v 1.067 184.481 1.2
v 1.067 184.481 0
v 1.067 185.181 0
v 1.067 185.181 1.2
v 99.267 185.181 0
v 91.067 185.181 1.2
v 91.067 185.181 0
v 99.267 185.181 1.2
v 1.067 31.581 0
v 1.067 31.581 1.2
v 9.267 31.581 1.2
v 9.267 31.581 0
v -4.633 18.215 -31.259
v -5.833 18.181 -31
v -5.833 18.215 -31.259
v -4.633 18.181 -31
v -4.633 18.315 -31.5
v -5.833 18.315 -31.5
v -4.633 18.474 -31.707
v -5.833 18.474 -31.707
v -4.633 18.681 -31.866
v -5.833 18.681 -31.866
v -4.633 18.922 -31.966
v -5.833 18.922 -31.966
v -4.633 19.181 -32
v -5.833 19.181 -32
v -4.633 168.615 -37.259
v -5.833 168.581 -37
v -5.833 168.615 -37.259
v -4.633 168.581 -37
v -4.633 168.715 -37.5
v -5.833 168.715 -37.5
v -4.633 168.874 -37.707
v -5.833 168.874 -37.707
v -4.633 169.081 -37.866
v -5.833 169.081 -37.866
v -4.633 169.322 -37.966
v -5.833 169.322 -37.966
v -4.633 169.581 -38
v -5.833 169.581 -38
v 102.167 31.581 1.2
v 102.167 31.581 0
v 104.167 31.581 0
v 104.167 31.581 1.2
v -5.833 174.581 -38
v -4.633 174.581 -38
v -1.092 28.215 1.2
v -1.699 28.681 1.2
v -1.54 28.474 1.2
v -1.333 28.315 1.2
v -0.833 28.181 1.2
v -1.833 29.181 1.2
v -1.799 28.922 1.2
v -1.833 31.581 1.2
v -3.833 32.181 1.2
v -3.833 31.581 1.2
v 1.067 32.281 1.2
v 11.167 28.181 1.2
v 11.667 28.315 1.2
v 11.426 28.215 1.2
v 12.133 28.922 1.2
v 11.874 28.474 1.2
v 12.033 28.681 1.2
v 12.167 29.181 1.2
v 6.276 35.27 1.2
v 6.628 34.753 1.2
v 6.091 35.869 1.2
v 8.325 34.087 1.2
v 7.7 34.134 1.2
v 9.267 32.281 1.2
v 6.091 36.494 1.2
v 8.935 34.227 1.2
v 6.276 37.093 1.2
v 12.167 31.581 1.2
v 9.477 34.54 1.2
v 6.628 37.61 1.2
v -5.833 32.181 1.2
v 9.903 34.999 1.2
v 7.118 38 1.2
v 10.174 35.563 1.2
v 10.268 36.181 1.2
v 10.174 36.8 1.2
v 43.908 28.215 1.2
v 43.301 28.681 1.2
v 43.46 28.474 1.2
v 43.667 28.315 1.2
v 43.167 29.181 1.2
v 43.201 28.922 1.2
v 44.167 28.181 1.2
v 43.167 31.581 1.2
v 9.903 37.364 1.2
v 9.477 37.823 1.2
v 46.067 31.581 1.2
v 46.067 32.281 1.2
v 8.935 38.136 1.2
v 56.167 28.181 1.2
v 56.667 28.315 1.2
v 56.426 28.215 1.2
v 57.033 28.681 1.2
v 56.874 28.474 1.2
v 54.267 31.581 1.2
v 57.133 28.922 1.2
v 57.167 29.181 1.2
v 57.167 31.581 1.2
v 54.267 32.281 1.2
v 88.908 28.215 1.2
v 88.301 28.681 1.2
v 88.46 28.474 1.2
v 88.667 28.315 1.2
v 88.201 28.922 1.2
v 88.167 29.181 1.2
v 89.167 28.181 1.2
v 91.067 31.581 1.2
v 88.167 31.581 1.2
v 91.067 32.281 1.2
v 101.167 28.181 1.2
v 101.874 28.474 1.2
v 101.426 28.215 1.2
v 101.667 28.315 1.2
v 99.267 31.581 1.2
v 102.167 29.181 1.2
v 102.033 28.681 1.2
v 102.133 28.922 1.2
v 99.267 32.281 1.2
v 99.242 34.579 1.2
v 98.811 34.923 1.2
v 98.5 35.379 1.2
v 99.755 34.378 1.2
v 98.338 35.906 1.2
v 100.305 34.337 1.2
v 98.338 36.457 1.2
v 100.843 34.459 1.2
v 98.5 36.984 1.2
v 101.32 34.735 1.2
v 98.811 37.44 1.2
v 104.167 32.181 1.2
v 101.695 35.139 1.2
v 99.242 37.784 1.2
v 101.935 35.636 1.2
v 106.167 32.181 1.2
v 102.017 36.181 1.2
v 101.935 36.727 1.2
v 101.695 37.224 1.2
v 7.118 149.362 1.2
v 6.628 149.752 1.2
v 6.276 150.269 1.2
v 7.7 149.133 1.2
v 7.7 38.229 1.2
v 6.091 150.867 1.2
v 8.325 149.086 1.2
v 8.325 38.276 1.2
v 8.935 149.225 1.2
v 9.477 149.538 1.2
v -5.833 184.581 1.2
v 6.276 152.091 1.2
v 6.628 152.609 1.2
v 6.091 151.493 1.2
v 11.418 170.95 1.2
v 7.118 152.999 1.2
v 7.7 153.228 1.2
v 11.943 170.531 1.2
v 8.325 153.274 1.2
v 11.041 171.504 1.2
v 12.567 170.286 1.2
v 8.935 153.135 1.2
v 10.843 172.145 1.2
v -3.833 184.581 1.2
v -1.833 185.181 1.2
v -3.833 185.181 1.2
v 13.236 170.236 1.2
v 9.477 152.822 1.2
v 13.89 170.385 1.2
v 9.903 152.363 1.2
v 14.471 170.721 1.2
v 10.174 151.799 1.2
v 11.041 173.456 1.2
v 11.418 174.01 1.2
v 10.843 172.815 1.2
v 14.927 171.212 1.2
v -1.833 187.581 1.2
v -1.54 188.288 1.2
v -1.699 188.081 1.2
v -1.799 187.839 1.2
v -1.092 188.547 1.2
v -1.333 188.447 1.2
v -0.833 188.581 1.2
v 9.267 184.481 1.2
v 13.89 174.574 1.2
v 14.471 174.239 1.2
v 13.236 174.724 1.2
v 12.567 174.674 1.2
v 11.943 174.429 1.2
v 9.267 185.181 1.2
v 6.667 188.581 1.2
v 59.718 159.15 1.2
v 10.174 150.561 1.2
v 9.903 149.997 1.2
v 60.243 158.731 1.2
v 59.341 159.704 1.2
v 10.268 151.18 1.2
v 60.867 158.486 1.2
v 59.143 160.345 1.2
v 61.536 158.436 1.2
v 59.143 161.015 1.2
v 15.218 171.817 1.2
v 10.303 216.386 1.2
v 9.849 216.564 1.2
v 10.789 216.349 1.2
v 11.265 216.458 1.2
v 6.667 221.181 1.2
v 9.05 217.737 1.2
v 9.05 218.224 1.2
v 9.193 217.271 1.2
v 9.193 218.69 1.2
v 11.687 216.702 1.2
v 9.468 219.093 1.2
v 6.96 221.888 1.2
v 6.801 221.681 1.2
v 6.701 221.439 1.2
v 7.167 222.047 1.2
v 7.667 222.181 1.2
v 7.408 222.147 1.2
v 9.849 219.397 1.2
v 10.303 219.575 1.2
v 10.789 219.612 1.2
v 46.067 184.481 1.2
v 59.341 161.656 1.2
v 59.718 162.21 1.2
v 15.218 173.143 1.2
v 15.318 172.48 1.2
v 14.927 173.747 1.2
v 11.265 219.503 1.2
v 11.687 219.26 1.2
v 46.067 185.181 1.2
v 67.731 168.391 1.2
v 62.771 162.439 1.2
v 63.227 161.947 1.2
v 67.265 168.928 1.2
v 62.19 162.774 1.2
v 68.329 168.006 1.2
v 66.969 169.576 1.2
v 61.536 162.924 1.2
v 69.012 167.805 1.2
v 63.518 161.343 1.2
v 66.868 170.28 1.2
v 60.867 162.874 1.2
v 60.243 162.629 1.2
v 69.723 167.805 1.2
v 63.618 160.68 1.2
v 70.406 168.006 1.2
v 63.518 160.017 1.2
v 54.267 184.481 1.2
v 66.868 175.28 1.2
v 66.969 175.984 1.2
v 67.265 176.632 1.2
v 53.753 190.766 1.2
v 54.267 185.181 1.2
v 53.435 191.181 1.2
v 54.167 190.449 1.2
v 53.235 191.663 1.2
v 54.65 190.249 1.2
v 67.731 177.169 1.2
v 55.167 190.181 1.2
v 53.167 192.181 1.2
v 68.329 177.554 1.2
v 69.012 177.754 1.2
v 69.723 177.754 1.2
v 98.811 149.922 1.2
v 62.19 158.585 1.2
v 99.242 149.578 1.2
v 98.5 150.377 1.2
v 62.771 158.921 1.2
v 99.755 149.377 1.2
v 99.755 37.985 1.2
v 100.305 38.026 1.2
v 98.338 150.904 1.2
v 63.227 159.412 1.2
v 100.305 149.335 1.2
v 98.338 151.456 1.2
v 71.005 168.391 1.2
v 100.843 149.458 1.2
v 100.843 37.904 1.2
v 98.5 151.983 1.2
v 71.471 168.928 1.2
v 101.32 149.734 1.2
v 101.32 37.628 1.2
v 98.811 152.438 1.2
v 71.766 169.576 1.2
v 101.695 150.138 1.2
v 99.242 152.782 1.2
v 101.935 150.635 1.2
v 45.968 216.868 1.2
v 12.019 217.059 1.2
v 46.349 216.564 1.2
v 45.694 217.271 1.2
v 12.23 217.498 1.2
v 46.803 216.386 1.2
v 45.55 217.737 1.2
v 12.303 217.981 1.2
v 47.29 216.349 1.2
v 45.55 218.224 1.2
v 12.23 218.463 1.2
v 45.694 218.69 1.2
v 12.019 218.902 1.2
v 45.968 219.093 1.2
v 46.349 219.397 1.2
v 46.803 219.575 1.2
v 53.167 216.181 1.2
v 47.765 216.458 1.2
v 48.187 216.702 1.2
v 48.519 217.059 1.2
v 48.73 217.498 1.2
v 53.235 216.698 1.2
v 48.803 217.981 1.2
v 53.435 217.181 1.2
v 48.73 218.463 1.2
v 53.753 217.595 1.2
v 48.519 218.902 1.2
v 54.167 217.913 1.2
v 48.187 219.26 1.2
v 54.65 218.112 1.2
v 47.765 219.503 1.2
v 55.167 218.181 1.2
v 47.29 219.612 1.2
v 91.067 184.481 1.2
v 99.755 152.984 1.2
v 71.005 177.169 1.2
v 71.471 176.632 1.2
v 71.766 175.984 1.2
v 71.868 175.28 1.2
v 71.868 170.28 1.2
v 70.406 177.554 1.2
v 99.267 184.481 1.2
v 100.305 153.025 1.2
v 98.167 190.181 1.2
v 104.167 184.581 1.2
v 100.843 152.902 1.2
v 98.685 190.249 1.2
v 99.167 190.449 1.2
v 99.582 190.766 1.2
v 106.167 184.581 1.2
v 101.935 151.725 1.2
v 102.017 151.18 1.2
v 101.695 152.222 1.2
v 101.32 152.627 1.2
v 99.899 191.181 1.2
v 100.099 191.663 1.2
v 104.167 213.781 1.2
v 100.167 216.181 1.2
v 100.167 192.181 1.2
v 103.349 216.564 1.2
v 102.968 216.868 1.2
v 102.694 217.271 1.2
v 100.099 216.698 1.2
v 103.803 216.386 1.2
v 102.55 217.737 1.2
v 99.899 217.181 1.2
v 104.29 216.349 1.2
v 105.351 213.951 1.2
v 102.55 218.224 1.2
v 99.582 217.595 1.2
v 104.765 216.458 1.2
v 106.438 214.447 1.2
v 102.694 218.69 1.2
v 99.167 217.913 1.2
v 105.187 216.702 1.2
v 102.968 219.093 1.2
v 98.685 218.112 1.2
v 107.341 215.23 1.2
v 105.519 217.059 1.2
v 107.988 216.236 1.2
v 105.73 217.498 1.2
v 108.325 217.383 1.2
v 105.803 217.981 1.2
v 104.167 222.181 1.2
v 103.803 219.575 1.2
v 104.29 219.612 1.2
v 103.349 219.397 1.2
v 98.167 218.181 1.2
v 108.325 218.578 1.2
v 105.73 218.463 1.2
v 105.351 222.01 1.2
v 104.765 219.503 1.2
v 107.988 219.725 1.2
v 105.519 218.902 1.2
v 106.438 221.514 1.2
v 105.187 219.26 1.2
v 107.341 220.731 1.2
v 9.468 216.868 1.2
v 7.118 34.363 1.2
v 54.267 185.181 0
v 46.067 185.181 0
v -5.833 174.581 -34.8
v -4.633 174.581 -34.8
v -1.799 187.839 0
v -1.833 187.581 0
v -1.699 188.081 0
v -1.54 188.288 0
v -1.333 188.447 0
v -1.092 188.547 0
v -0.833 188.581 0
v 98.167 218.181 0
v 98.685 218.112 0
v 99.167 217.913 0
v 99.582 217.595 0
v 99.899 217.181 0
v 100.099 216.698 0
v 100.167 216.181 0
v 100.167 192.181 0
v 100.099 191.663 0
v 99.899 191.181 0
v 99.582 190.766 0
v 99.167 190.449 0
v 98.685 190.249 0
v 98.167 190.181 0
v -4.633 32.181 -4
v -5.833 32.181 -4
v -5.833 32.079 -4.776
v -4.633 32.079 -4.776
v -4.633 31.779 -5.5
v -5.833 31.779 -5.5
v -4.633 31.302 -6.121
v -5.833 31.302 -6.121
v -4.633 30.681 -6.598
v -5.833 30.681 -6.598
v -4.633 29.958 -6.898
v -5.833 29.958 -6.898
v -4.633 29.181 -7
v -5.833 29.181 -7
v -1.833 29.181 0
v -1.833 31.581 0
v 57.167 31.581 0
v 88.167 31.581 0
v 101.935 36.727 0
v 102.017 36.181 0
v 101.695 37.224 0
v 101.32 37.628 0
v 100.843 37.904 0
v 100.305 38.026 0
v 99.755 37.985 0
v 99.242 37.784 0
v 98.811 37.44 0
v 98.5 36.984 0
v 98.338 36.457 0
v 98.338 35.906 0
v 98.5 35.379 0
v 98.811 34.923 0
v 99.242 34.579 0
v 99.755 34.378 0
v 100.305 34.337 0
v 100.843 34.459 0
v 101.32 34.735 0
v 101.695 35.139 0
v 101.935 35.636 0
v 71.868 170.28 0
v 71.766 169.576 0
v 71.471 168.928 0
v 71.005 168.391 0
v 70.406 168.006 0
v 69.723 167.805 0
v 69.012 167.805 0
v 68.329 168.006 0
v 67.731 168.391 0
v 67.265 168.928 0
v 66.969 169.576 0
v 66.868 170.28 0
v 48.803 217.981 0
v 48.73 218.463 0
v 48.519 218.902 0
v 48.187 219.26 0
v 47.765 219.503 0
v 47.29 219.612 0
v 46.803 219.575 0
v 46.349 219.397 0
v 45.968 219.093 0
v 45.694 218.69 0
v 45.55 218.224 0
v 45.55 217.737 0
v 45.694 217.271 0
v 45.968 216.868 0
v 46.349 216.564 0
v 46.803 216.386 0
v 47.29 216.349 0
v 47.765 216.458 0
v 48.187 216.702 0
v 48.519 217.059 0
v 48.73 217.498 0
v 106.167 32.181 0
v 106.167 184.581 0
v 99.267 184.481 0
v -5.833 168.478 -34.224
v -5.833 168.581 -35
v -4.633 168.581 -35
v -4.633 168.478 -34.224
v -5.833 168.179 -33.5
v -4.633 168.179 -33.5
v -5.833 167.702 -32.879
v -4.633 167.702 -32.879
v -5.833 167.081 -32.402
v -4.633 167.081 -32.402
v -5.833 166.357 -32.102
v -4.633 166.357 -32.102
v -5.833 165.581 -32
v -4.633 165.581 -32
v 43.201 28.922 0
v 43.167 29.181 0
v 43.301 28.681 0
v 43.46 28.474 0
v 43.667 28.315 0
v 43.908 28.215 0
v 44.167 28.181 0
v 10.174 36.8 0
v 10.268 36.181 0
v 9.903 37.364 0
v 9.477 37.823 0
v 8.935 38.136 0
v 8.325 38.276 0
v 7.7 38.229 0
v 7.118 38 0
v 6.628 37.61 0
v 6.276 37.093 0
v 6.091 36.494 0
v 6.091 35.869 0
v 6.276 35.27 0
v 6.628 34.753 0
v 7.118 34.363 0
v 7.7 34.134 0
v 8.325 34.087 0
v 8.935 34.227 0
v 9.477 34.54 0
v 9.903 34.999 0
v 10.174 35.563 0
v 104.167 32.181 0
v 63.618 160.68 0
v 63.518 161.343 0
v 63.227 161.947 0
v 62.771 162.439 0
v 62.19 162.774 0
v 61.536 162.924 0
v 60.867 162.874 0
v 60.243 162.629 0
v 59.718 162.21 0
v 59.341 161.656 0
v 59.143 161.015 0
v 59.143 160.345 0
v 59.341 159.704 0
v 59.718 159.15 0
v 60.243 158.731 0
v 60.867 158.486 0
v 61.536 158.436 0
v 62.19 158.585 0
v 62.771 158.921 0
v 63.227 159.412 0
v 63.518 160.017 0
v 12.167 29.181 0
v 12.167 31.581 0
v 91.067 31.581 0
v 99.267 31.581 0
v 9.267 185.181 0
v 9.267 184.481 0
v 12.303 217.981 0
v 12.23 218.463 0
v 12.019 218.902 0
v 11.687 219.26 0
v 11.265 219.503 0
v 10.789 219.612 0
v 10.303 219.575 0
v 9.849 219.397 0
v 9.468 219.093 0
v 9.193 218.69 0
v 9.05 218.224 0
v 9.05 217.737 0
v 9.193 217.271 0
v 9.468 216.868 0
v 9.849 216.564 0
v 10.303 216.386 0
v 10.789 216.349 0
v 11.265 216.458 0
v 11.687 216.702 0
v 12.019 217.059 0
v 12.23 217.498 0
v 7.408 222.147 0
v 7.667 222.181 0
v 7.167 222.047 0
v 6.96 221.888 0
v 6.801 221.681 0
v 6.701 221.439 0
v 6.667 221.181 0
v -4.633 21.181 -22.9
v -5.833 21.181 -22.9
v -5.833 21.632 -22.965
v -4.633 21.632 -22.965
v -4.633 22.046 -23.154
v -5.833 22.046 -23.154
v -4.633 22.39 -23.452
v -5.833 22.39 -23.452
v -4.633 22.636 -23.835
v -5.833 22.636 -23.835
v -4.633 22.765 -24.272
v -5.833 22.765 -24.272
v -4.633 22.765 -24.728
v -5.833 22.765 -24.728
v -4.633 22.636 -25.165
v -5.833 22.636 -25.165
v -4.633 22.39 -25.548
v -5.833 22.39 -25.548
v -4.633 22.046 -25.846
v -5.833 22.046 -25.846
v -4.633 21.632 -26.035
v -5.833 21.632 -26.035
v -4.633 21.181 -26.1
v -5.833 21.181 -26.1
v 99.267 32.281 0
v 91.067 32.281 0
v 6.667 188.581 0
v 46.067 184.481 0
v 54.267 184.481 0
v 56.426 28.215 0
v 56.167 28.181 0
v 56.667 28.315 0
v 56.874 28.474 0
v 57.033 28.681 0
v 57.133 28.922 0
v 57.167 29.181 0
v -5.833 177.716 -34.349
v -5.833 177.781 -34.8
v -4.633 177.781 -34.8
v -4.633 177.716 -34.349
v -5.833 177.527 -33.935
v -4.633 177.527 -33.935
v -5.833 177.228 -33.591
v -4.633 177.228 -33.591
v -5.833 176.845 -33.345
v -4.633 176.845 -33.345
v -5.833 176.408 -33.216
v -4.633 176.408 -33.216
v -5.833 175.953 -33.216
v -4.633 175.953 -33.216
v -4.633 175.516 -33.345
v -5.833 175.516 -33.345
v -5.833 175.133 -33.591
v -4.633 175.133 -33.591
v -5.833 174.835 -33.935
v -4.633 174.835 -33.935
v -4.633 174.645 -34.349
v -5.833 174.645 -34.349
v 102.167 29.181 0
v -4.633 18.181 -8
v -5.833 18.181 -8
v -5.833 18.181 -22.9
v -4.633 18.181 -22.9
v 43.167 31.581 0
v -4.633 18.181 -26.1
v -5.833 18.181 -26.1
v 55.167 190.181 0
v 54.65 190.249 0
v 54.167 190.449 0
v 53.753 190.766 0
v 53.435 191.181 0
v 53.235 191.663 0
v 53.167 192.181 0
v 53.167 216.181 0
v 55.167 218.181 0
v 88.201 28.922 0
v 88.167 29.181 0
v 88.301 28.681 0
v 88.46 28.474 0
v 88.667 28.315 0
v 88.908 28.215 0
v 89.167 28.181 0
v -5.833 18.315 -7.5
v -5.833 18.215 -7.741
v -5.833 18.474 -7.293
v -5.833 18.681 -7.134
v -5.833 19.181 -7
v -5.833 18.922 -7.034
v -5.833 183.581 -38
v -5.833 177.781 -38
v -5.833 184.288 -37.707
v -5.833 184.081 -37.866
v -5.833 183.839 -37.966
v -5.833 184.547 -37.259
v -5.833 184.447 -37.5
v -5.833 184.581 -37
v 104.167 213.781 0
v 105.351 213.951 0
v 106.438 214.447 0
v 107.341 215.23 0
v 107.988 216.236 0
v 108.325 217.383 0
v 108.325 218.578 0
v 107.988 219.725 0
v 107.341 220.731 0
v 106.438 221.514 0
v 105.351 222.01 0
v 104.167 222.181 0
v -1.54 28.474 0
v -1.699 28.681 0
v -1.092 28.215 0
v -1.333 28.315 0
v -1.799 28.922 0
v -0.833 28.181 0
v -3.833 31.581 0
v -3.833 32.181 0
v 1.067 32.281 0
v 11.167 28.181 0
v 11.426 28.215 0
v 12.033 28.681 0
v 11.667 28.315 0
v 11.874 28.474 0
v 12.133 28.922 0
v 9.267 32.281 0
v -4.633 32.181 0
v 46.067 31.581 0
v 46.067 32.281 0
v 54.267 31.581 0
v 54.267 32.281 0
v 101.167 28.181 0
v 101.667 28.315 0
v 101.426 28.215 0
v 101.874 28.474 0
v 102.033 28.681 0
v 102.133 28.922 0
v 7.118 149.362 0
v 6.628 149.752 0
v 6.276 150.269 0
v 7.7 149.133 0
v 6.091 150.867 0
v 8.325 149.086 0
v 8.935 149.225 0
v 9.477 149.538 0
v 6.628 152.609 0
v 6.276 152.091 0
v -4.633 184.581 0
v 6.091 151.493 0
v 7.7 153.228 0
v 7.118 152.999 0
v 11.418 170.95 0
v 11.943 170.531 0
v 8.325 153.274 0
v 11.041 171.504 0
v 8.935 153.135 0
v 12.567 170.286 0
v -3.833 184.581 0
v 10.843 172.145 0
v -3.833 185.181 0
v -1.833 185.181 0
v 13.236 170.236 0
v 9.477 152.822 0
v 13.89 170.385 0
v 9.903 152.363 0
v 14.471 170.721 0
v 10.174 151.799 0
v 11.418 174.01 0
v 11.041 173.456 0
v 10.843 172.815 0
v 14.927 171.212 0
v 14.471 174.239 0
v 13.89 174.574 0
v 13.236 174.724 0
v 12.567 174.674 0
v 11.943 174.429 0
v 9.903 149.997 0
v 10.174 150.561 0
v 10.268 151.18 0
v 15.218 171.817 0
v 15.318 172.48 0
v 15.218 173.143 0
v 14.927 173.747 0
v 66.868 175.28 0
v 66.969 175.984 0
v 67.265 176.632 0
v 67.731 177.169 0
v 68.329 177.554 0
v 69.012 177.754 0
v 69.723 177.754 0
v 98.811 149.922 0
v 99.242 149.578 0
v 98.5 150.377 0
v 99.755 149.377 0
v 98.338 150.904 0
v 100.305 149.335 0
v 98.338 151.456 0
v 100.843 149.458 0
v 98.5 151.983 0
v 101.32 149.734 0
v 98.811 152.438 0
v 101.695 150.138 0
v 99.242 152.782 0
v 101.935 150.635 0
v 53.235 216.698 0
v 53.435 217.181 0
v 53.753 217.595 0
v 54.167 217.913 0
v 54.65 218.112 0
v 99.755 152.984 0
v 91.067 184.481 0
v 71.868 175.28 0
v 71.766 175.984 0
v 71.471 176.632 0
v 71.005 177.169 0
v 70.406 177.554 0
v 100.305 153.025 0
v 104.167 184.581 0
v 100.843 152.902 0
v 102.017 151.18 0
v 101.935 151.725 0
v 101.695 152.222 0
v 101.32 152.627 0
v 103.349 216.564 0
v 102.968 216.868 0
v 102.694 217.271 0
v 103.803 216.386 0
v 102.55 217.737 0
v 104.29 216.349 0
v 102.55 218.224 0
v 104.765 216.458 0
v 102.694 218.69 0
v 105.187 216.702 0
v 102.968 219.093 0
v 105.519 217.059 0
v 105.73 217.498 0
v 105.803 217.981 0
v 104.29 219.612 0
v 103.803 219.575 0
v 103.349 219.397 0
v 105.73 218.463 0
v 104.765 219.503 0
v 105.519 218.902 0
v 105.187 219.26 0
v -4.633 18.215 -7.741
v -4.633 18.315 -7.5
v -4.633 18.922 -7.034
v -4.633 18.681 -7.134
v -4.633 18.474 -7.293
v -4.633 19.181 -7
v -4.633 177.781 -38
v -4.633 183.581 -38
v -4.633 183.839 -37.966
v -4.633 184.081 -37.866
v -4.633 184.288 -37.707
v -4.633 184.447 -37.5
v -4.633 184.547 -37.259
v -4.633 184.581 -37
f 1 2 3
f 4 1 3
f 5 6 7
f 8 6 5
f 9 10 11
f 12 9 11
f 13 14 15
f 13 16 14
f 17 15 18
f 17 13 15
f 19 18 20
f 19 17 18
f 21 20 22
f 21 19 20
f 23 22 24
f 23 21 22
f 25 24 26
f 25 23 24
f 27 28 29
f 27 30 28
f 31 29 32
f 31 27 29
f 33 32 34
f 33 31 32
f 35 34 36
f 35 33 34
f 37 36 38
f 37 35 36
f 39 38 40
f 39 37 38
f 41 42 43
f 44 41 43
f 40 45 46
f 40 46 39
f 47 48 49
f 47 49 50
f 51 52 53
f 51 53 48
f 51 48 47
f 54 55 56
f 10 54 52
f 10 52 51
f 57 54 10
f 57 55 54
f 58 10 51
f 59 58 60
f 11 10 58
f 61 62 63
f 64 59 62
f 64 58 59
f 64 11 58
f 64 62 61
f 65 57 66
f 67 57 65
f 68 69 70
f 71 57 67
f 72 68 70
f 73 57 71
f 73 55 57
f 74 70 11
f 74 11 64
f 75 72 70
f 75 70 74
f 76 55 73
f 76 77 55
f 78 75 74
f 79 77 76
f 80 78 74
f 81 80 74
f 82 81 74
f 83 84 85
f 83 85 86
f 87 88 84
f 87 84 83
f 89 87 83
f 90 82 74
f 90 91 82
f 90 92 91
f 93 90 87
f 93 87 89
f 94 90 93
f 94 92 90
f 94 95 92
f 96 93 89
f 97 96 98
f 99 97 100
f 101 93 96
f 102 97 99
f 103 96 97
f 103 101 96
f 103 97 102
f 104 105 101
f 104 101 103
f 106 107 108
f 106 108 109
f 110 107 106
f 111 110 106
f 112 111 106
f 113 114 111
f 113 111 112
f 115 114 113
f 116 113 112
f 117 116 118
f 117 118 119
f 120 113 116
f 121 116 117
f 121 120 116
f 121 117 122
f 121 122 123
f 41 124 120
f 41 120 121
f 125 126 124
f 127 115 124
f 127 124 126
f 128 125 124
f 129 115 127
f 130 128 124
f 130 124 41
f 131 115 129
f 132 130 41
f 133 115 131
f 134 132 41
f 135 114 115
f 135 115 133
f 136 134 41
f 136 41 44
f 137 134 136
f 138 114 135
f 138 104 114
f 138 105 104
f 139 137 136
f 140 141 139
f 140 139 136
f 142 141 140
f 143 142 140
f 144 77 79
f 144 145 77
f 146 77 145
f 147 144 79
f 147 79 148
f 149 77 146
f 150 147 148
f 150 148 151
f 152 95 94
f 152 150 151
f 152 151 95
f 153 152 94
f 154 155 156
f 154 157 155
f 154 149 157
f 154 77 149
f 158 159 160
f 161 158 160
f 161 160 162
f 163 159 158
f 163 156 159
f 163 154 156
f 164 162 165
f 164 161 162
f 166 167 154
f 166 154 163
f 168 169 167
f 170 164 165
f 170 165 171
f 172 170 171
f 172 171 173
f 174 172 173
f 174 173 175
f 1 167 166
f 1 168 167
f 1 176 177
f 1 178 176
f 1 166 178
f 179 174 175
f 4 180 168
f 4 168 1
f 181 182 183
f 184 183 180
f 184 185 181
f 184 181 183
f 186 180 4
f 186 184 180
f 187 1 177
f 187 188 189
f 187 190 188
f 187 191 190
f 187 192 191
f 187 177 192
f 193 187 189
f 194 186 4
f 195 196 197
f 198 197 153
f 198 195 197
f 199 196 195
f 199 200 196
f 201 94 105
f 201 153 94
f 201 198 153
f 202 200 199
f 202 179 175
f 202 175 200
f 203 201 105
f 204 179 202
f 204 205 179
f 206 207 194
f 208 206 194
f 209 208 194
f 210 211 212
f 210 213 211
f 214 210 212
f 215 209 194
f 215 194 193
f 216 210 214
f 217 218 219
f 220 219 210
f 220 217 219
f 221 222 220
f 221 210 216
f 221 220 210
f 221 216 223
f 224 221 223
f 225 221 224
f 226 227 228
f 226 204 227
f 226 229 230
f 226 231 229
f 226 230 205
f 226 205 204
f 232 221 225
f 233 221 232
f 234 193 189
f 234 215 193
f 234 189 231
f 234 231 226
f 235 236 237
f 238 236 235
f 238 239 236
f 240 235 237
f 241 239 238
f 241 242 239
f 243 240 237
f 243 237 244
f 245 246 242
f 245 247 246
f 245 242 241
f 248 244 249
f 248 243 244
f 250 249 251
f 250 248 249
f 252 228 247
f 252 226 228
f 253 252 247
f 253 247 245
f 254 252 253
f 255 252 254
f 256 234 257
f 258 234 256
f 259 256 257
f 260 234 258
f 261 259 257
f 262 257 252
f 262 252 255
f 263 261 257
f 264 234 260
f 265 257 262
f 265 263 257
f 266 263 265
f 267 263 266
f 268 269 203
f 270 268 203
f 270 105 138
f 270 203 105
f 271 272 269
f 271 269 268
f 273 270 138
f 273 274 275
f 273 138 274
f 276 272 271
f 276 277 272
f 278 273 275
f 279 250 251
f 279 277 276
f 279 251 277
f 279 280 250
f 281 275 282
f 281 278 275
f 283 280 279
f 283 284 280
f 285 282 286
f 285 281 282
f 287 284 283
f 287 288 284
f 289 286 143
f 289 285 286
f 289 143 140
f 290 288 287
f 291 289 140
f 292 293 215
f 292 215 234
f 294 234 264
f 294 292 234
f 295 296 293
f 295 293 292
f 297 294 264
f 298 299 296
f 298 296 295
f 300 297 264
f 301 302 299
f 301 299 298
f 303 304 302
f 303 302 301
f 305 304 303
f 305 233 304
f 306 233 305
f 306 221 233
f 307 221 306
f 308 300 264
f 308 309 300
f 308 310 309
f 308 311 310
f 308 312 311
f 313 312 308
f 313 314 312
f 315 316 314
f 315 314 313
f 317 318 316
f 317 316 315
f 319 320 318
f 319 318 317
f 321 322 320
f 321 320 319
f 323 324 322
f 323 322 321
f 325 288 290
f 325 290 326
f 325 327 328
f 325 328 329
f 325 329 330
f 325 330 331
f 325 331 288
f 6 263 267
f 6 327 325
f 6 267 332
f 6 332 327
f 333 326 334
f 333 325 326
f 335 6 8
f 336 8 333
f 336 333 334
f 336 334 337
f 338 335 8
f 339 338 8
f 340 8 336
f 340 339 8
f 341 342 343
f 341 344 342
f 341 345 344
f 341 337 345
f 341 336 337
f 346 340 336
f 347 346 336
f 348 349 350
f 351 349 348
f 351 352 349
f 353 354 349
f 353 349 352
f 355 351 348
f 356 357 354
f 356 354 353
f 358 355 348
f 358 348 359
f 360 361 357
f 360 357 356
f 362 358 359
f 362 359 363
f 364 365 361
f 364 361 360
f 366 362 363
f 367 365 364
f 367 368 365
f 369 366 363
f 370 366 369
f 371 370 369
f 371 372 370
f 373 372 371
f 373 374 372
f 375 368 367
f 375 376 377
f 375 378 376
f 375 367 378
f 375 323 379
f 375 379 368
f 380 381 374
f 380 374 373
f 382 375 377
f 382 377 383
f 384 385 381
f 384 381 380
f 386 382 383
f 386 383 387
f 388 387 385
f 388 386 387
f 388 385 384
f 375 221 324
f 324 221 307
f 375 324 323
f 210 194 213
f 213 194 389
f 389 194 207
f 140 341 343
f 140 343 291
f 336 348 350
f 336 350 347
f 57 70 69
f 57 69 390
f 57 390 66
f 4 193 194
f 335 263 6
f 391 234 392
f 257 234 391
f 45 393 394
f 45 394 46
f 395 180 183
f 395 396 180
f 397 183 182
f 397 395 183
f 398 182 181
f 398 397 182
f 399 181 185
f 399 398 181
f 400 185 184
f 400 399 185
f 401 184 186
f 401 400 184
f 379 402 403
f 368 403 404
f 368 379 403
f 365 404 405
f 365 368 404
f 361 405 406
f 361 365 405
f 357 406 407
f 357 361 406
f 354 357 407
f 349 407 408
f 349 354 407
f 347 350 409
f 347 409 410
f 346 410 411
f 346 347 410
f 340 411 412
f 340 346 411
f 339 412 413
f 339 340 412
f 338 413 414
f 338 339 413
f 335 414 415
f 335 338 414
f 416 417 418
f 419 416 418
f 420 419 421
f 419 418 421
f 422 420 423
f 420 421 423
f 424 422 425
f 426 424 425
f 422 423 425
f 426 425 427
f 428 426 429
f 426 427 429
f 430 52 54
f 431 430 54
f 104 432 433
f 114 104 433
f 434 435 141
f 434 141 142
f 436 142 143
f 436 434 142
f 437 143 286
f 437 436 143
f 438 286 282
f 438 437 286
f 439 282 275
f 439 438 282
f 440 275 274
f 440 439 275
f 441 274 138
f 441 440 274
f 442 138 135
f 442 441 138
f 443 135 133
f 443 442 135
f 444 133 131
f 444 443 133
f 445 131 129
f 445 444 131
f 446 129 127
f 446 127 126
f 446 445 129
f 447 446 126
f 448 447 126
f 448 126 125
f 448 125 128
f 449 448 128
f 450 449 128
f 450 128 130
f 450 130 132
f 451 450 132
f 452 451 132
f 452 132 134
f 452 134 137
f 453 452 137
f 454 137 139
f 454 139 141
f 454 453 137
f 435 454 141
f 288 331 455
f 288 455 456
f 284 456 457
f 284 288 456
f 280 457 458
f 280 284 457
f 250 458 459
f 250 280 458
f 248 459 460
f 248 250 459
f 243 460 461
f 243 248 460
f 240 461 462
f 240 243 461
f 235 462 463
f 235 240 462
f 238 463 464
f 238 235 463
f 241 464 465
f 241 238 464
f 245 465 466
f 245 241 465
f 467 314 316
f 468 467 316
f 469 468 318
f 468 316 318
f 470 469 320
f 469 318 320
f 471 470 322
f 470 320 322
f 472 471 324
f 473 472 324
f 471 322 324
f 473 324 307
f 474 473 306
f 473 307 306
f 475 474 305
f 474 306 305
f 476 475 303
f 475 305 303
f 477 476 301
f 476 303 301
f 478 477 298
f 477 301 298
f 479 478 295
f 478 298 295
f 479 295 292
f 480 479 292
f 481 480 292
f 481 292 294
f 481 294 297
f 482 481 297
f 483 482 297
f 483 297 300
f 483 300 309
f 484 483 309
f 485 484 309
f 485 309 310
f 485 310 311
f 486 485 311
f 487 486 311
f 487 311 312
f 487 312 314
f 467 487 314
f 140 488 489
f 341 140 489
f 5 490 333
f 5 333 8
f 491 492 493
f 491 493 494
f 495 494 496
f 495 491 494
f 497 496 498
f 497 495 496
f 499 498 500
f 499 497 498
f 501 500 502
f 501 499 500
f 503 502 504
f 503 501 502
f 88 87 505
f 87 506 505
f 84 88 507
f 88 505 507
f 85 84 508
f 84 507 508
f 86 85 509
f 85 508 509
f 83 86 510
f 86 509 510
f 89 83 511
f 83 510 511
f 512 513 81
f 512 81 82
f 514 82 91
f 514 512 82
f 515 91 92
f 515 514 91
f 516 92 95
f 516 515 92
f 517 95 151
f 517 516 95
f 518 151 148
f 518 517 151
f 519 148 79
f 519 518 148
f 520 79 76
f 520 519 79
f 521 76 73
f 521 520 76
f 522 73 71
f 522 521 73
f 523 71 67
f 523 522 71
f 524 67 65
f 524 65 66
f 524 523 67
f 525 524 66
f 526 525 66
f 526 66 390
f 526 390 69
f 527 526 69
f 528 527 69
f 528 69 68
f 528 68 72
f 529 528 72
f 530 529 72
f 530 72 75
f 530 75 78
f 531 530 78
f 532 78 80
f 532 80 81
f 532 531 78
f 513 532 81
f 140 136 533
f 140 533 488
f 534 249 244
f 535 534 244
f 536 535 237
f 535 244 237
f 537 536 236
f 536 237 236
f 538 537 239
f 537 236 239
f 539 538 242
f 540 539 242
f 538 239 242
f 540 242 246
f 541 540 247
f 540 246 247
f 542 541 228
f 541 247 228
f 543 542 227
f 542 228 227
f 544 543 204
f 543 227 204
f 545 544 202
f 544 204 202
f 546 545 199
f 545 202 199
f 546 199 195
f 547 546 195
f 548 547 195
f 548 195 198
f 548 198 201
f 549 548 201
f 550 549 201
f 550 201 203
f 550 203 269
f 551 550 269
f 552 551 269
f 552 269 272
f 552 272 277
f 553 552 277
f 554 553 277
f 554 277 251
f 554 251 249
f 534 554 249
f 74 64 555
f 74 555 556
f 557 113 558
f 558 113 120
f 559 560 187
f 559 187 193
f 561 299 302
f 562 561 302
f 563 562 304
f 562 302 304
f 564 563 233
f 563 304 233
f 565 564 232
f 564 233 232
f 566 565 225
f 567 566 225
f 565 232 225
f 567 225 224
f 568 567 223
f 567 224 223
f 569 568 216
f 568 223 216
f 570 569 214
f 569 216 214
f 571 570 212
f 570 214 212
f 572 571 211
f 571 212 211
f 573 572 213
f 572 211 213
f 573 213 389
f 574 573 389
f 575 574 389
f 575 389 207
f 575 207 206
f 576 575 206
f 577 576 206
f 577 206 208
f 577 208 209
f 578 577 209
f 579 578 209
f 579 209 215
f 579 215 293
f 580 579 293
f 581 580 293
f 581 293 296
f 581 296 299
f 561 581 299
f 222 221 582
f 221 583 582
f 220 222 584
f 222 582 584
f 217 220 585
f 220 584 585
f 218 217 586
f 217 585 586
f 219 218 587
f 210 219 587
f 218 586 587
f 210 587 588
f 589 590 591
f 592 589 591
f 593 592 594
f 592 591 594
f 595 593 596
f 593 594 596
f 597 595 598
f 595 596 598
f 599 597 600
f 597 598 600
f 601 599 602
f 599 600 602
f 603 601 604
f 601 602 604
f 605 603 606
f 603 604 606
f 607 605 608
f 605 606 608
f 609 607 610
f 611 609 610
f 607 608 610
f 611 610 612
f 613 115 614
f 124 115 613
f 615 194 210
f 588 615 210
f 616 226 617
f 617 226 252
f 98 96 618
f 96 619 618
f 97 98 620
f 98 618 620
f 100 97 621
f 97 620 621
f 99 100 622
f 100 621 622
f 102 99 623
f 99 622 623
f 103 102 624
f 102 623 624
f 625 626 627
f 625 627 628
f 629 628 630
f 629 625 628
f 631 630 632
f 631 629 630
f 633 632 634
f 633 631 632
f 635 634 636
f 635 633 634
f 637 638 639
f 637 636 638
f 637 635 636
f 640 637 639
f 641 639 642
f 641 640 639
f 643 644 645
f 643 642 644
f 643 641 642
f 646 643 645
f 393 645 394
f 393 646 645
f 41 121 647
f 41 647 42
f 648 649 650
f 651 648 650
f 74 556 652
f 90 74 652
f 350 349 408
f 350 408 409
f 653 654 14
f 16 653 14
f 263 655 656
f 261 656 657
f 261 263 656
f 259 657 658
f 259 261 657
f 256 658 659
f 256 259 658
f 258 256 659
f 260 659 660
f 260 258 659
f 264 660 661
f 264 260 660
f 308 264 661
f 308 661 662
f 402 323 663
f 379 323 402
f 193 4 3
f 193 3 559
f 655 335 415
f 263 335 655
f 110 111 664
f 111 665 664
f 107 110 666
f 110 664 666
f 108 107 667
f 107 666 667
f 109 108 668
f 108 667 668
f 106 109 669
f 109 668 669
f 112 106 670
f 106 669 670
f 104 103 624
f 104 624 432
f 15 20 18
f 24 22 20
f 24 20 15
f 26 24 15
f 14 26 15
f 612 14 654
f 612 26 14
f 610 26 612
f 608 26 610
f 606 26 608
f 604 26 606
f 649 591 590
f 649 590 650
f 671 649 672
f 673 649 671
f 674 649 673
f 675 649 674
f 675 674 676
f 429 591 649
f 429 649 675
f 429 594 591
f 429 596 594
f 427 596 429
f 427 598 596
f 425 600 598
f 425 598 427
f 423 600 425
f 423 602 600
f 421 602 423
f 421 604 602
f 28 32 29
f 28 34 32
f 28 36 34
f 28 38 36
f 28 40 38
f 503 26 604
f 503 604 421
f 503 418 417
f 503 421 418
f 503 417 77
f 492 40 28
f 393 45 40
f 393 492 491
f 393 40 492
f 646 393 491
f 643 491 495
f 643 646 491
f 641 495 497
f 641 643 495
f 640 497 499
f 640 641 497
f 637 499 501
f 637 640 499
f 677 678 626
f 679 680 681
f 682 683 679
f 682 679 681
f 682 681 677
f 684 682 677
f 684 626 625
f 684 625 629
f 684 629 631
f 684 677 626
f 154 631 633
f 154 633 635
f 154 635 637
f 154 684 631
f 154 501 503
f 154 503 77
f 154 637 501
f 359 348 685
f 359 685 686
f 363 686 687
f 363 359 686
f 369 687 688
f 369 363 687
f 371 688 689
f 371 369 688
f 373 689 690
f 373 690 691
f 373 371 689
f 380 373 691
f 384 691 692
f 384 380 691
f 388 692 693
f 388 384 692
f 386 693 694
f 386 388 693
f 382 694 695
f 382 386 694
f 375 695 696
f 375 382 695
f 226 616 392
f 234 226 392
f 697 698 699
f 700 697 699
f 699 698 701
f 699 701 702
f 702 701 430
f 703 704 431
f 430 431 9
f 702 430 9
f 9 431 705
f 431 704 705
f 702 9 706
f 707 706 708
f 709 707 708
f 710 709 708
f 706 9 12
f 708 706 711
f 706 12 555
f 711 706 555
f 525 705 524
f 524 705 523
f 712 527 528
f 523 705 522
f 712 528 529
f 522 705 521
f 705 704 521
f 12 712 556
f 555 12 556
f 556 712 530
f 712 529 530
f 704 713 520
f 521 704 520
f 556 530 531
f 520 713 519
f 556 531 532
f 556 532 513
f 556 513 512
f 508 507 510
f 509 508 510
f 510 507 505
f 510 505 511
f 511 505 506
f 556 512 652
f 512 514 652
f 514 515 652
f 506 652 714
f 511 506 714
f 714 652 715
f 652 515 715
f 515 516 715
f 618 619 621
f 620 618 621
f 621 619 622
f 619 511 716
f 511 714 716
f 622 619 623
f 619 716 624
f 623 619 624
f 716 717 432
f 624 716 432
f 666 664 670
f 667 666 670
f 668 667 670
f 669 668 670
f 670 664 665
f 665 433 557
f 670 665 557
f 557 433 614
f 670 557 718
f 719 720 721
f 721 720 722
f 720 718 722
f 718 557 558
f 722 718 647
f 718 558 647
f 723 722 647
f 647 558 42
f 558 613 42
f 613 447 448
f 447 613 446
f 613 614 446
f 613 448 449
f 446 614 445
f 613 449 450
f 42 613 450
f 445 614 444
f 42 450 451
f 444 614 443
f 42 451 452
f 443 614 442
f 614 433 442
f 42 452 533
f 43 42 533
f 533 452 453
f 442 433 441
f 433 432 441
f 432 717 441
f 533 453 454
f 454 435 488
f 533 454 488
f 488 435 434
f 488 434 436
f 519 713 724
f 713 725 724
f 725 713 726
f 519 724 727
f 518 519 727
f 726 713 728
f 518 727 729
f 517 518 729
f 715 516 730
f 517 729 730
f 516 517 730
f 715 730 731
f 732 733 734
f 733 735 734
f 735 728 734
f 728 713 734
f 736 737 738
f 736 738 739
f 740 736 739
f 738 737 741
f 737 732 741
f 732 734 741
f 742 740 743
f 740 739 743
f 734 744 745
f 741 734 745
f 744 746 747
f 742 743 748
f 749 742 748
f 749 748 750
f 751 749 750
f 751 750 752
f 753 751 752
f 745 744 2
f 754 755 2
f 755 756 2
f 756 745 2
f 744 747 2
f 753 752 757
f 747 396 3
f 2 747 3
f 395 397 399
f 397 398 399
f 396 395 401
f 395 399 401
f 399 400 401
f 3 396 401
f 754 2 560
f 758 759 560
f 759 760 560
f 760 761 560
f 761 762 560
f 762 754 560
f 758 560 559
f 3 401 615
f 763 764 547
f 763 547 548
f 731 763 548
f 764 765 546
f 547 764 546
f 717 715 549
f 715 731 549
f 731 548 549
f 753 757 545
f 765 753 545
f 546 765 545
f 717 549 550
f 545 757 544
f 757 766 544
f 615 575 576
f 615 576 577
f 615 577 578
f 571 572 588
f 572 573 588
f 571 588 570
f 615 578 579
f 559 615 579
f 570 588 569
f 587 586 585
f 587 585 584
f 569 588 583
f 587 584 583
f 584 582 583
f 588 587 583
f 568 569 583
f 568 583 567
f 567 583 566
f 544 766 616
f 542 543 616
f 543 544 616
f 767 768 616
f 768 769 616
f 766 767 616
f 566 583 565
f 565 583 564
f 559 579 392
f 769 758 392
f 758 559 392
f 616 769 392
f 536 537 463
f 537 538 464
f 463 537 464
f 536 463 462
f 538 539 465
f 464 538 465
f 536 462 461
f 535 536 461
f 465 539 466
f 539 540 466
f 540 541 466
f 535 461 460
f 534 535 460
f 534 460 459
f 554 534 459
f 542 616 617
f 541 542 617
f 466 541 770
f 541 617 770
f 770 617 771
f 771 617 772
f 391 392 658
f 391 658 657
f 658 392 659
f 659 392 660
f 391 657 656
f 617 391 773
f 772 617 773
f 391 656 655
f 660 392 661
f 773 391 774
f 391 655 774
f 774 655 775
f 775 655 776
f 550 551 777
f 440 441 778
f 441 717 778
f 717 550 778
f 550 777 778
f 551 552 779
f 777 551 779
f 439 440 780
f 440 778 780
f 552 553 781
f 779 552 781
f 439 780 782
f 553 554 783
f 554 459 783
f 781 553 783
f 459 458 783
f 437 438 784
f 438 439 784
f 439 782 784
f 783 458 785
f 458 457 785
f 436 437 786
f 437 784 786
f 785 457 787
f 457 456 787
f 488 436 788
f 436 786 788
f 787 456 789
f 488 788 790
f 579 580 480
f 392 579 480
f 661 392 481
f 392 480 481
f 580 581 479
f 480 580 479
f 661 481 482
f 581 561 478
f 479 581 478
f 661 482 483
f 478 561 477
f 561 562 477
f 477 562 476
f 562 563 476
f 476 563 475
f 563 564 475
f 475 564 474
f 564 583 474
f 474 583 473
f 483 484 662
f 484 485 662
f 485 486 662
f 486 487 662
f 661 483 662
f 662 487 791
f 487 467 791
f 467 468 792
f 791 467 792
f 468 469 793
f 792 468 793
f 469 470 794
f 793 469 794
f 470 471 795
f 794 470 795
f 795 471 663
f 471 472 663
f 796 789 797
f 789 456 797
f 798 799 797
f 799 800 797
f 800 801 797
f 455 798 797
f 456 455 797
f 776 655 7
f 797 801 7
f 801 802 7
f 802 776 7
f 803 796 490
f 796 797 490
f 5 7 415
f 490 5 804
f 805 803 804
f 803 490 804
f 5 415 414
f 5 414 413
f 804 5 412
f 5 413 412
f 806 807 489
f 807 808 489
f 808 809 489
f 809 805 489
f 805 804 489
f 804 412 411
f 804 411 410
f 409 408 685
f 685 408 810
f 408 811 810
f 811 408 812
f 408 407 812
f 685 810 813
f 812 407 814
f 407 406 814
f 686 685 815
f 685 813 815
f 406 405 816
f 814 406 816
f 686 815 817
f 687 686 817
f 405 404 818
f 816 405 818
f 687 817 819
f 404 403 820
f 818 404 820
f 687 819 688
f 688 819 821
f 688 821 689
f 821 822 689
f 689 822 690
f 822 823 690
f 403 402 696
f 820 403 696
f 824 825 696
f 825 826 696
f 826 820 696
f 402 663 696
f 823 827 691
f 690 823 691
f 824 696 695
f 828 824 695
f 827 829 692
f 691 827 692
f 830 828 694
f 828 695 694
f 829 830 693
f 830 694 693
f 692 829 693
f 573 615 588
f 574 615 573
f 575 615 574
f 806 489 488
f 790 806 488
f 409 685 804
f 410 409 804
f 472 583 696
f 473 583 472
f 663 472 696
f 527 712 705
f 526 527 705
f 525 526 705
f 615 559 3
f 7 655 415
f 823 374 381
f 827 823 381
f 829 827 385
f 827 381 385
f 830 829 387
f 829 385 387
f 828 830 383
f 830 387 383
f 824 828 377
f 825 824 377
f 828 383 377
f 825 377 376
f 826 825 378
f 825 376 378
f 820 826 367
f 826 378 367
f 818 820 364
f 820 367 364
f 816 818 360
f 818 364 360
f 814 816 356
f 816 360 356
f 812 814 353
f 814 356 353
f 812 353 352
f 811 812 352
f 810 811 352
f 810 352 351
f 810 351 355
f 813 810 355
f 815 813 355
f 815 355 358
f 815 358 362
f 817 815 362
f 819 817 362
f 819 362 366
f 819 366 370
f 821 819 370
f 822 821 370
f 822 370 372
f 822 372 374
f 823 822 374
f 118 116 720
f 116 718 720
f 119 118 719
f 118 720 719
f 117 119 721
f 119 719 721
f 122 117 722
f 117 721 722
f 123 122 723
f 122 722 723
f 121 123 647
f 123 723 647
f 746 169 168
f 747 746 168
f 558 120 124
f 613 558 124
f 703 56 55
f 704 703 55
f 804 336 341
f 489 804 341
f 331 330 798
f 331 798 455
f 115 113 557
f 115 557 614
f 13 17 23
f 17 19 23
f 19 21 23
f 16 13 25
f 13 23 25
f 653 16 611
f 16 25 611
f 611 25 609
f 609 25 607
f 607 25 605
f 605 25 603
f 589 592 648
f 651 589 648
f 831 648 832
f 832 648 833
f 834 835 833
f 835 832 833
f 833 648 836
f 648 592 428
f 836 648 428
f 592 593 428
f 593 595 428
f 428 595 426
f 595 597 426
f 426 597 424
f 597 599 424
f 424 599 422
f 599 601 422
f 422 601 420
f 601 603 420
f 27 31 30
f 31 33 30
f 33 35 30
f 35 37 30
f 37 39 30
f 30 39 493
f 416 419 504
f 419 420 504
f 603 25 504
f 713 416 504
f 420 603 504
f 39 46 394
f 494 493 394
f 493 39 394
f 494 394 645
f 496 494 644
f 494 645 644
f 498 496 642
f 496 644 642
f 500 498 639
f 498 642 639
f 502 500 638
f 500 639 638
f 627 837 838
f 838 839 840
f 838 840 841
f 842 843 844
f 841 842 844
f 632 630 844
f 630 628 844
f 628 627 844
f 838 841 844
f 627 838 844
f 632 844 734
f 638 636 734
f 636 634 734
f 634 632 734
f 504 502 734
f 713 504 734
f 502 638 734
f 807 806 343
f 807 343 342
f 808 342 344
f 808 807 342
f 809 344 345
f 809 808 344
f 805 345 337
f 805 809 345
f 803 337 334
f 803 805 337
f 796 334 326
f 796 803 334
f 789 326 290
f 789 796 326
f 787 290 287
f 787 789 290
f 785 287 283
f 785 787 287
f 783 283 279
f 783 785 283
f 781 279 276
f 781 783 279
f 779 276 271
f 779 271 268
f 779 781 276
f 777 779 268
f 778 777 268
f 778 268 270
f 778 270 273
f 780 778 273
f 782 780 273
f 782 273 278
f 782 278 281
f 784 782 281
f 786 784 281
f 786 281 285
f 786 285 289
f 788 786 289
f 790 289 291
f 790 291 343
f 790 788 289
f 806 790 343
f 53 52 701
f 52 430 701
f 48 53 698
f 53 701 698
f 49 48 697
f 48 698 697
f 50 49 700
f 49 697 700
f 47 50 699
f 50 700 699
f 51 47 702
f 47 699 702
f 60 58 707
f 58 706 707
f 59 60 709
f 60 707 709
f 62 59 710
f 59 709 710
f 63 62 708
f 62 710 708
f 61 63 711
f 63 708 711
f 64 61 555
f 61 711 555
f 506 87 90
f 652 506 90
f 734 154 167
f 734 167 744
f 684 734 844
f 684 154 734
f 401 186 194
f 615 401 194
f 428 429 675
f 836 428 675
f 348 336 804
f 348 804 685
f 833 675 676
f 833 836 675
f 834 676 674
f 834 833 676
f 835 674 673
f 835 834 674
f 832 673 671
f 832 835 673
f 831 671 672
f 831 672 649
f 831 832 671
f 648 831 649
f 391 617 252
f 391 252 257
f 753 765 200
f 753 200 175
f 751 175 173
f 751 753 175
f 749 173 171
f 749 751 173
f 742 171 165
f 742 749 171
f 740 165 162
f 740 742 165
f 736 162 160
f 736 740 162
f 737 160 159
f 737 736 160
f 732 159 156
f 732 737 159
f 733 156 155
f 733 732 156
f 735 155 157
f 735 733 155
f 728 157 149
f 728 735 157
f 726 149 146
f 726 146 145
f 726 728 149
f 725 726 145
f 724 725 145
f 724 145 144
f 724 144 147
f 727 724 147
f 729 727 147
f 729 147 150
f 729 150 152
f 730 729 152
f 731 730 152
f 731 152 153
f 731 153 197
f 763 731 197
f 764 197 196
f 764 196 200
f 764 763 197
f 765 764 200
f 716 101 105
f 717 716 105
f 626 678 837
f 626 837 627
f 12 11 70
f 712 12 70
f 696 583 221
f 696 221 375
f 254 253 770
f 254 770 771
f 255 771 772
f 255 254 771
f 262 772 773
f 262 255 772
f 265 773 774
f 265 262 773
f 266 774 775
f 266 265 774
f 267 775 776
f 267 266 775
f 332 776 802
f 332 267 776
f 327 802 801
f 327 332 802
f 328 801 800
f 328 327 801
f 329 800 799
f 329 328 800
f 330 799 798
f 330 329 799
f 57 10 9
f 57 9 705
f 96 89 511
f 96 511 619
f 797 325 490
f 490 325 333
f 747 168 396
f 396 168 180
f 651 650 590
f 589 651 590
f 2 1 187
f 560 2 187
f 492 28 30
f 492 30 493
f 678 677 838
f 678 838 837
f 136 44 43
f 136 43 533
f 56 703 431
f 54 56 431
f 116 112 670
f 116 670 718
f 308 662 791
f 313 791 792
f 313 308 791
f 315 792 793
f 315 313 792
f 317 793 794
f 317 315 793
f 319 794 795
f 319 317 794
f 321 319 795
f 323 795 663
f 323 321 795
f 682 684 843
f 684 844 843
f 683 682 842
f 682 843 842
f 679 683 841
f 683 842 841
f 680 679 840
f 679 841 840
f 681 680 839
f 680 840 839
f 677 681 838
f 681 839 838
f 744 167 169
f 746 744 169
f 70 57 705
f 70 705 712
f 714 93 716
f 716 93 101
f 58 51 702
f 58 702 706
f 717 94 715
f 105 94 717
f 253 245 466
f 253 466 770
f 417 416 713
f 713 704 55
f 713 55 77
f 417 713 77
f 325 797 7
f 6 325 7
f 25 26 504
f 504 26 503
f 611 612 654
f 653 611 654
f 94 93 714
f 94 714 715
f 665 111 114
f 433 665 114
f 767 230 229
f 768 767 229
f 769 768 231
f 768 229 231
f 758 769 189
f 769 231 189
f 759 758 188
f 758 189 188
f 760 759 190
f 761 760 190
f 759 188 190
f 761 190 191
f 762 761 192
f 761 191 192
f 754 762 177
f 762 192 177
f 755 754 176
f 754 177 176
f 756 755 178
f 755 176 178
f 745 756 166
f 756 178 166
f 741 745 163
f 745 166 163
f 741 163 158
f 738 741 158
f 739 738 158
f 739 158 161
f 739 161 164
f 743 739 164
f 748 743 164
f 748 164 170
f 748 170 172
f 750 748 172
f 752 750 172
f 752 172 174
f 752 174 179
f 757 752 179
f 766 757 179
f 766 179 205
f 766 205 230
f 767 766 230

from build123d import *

# Parameters (mm, degrees)
SKETCH2_W           = 112.00010125
SKETCH2_H           = 190.5995575
SKETCH2_R           = 2.1
SKETCH2_R_2         = 1.85
BOSS_EXTRUDE1_DEPTH = 1.2
SKETCH5_W           = 2
SKETCH5_H           = 37.6
SKETCH5_H_2         = 0.6
CUT_EXTRUDE2_DEPTH  = 247.246128205
CUT_EXTRUDE1_DEPTH  = 247.246128205
SKETCH9_W           = 14
SKETCH9_H           = 3.4
SKETCH9_W_2         = 8.5
BOSS_EXTRUDE5_DEPTH = 1.2
FILLET1_R           = 1
CUT_EXTRUDE4_REACH  = 248.246
SKETCH10_W          = 8.2
SKETCH10_H          = 0.7
SKETCH11_R          = 2.25
CUT_EXTRUDE5_DEPTH  = 247.246128205
BOSS_EXTRUDE6_DEPTH = 1.2
SKETCH13_R          = 1.635773904
CUT_EXTRUDE6_DEPTH  = 248.202612706
SKETCH14_W          = 1.2
SKETCH14_H          = 152.3995575
BOSS_EXTRUDE7_DEPTH = 32
BOSS_EXTRUDE8_DEPTH = 1.2
BOSS_EXTRUDE9_DEPTH = 1.2
CUT_EXTRUDE7_REACH  = 254.685
FILLET2_R           = 1


with BuildPart() as part:
    # Sketch2 → Boss-Extrude1 (new body)
    with BuildSketch(Plane.XY):
        with Locations((50.167238625, 126.88082875)):
            Rectangle(SKETCH2_W, SKETCH2_H)
        with Locations((8.16763175, 151.180160625)):
            Circle(SKETCH2_R, mode=Mode.SUBTRACT)
        with Locations((100.1668405, 151.180160625)):
            Circle(SKETCH2_R_2, mode=Mode.SUBTRACT)
        with Locations((100.1668405, 36.181495)):
            Circle(SKETCH2_R_2, mode=Mode.SUBTRACT)
        with Locations((8.16763175, 36.181495)):
            Circle(SKETCH2_R, mode=Mode.SUBTRACT)
    extrude(amount=BOSS_EXTRUDE1_DEPTH)

    # Sketch5 → Cut-Extrude2 (cut, through all)
    with BuildSketch(Plane.XY.offset(1.2)):
        Polygon((-3.832812, 185.1806075), (6.667188, 185.1806075), (6.667188, 222.1806075), (-5.832812, 222.1806075), (-5.832812, 185.1806075), (-5.832812, 184.5806075), (-3.832812, 184.5806075), align=None)
        with Locations((105.16728925, 203.3806075)):
            Rectangle(SKETCH5_W, SKETCH5_H)
        with Locations((-4.832812, 31.88105)):
            Rectangle(SKETCH5_W, SKETCH5_H_2)
        with Locations((105.16728925, 31.88105)):
            Rectangle(SKETCH5_W, SKETCH5_H_2)
    extrude(amount=-CUT_EXTRUDE2_DEPTH, mode=Mode.SUBTRACT)

    # Sketch4 → Cut-Extrude1 (cut, through all)
    with BuildSketch(Plane.XY.offset(1.2)):
        with BuildLine():
            Line((55.16728925, 218.1806075), (98.16728925, 218.1806075))
            ThreePointArc((98.16728925, 218.1806075), (99.581502812, 217.594821062), (100.16728925, 216.1806075))
            Line((100.16728925, 216.1806075), (100.16728925, 192.1806075))
            ThreePointArc((100.16728925, 192.1806075), (99.581502812, 190.766393938), (98.16728925, 190.1806075))
            Line((98.16728925, 190.1806075), (55.16728925, 190.1806075))
            ThreePointArc((55.16728925, 190.1806075), (53.753075688, 190.766393938), (53.16728925, 192.1806075))
            Line((53.16728925, 192.1806075), (53.16728925, 216.1806075))
            ThreePointArc((53.16728925, 216.1806075), (53.753075688, 217.594821062), (55.16728925, 218.1806075))
        make_face()
    extrude(amount=-CUT_EXTRUDE1_DEPTH, mode=Mode.SUBTRACT)

    # Sketch9 → Boss-Extrude5 (add)
    with BuildSketch(Plane.XY.offset(1.2)):
        with Locations((5.167188, 29.88105)):
            Rectangle(SKETCH9_W, SKETCH9_H)
        with Locations((95.16728925, 29.88105)):
            Rectangle(SKETCH9_W, SKETCH9_H)
        with Locations((50.167238625, 29.88105)):
            Rectangle(SKETCH9_W, SKETCH9_H)
        with Locations((2.417188, 186.8806075)):
            Rectangle(SKETCH9_W_2, SKETCH9_H)
    extrude(amount=-BOSS_EXTRUDE5_DEPTH)

    # Fillet1
    fillet1_edges = [part.edges().sort_by_distance(p)[0] for p in [
        (102.16728925, 28.18105, 0.6),
        (88.16728925, 28.18105, 0.6),
        (57.167238625, 28.18105, 0.6),
        (43.167238625, 28.18105, 0.6),
        (12.167188, 28.18105, 0.6),
        (-1.832812, 28.18105, 0.6),
        (-1.832812, 188.5806075, 0.6),
    ]]
    fillet(fillet1_edges, radius=FILLET1_R)

    # Sketch10 → Cut-Extrude4 (cut, up to next)
    with BuildSketch(Plane.XY.offset(1.2), mode=Mode.PRIVATE) as cut_extrude4_sk1:
        with Locations((95.16728925, 31.93105)):
            Rectangle(SKETCH10_W, SKETCH10_H)
    cut_extrude4_tool1 = extrude(cut_extrude4_sk1.sketch, amount=-CUT_EXTRUDE4_REACH, mode=Mode.PRIVATE) & part.part
    # Sketch10 → Cut-Extrude4 (cut, up to next)
    with BuildSketch(Plane.XY.offset(1.2), mode=Mode.PRIVATE) as cut_extrude4_sk2:
        with Locations((50.167238625, 31.93105)):
            Rectangle(SKETCH10_W, SKETCH10_H)
    cut_extrude4_tool2 = extrude(cut_extrude4_sk2.sketch, amount=-CUT_EXTRUDE4_REACH, mode=Mode.PRIVATE) & part.part
    # Sketch10 → Cut-Extrude4 (cut, up to next)
    with BuildSketch(Plane.XY.offset(1.2), mode=Mode.PRIVATE) as cut_extrude4_sk3:
        with Locations((5.167188, 31.93105)):
            Rectangle(SKETCH10_W, SKETCH10_H)
    cut_extrude4_tool3 = extrude(cut_extrude4_sk3.sketch, amount=-CUT_EXTRUDE4_REACH, mode=Mode.PRIVATE) & part.part
    # Sketch10 → Cut-Extrude4 (cut, up to next)
    with BuildSketch(Plane.XY.offset(1.2), mode=Mode.PRIVATE) as cut_extrude4_sk4:
        with Locations((50.167238625, 184.8306075)):
            Rectangle(SKETCH10_W, SKETCH10_H)
    cut_extrude4_tool4 = extrude(cut_extrude4_sk4.sketch, amount=-CUT_EXTRUDE4_REACH, mode=Mode.PRIVATE) & part.part
    # Sketch10 → Cut-Extrude4 (cut, up to next)
    with BuildSketch(Plane.XY.offset(1.2), mode=Mode.PRIVATE) as cut_extrude4_sk5:
        with Locations((95.16728925, 184.8306075)):
            Rectangle(SKETCH10_W, SKETCH10_H)
    cut_extrude4_tool5 = extrude(cut_extrude4_sk5.sketch, amount=-CUT_EXTRUDE4_REACH, mode=Mode.PRIVATE) & part.part
    # Sketch10 → Cut-Extrude4 (cut, up to next)
    with BuildSketch(Plane.XY.offset(1.2), mode=Mode.PRIVATE) as cut_extrude4_sk6:
        with Locations((5.167188, 184.8306075)):
            Rectangle(SKETCH10_W, SKETCH10_H)
    cut_extrude4_tool6 = extrude(cut_extrude4_sk6.sketch, amount=-CUT_EXTRUDE4_REACH, mode=Mode.PRIVATE) & part.part
    add(cut_extrude4_tool1.solids().sort_by_distance((95.167289, 31.93105, 1.2))[0], mode=Mode.SUBTRACT)
    add(cut_extrude4_tool2.solids().sort_by_distance((50.167239, 31.93105, 1.2))[0], mode=Mode.SUBTRACT)
    add(cut_extrude4_tool3.solids().sort_by_distance((5.167188, 31.93105, 1.2))[0], mode=Mode.SUBTRACT)
    add(cut_extrude4_tool4.solids().sort_by_distance((50.167239, 184.830607, 1.2))[0], mode=Mode.SUBTRACT)
    add(cut_extrude4_tool5.solids().sort_by_distance((95.167289, 184.830607, 1.2))[0], mode=Mode.SUBTRACT)
    add(cut_extrude4_tool6.solids().sort_by_distance((5.167188, 184.830607, 1.2))[0], mode=Mode.SUBTRACT)

    # Sketch11 → Cut-Extrude5 (cut, through all)
    with BuildSketch(Plane.XY.offset(1.2)):
        with Locations((61.367697375, 160.67994375)):
            Circle(SKETCH11_R)
        with Locations((13.067697375, 172.47994375)):
            Circle(SKETCH11_R)
        with BuildLine():
            Line((71.867697375, 175.27994375), (71.867697375, 170.27994375))
            ThreePointArc((71.867697375, 170.27994375), (69.367697375, 167.77994375), (66.867697375, 170.27994375))
            Line((66.867697375, 170.27994375), (66.867697375, 175.27994375))
            ThreePointArc((66.867697375, 175.27994375), (69.367697375, 177.77994375), (71.867697375, 175.27994375))
        make_face()
    extrude(amount=-CUT_EXTRUDE5_DEPTH, mode=Mode.SUBTRACT)

    # Sketch12 → Boss-Extrude6 (add)
    with BuildSketch(Plane.XY.offset(1.2)):
        with BuildLine():
            Line((104.16728925, 222.1806075), (104.16728925, 213.7806075))
            ThreePointArc((104.16728925, 213.7806075), (108.36728925, 217.9806075), (104.16728925, 222.1806075))
        make_face()
    extrude(amount=-BOSS_EXTRUDE6_DEPTH)

    # Sketch13 → Cut-Extrude6 (cut, through all)
    with BuildSketch(Plane.XY.offset(1.2)):
        with Locations((104.16728925, 217.9806075)):
            Circle(SKETCH13_R)
        with Locations((47.16728925, 217.9806075)):
            Circle(SKETCH13_R)
        with Locations((10.667188, 217.9806075)):
            Circle(SKETCH13_R)
    extrude(amount=-CUT_EXTRUDE6_DEPTH, mode=Mode.SUBTRACT)

    # Sketch14 → Boss-Extrude7 (add)
    with BuildSketch(Plane(origin=(0, 0, 0), x_dir=(-1, 0, 0), z_dir=(0, 0, -1))):
        with Locations((5.232812, 108.38082875)):
            Rectangle(SKETCH14_W, SKETCH14_H)
    extrude(amount=BOSS_EXTRUDE7_DEPTH)

    # Sketch16 → Boss-Extrude8 (add)
    with BuildSketch(Plane.ZY.offset(5.832812)):
        with BuildLine():
            Line((-32, 32.18105), (-4, 32.18105))
            ThreePointArc((-4, 32.18105), (-6.121320344, 31.302370344), (-7, 29.18105))
            Line((-7, 29.18105), (-7, 18.18105))
            Line((-7, 18.18105), (-32, 18.18105))
            Line((-32, 18.18105), (-32, 32.18105))
        make_face()
    extrude(amount=-BOSS_EXTRUDE8_DEPTH)

    # Sketch17 → Boss-Extrude9 (add)
    with BuildSketch(Plane.ZY.offset(5.832812)):
        with BuildLine():
            Line((-32, 184.5806075), (-38, 184.5806075))
            Line((-38, 184.5806075), (-38, 168.5806075))
            Line((-38, 168.5806075), (-35, 168.5806075))
            ThreePointArc((-35, 168.5806075), (-32.878679656, 167.701927844), (-32, 165.5806075))
            Line((-32, 165.5806075), (-32, 184.5806075))
        make_face()
    extrude(amount=-BOSS_EXTRUDE9_DEPTH)

    # Sketch15 → Cut-Extrude7 (cut, up to next)
    with BuildSketch(Plane.ZY.offset(5.832812), mode=Mode.PRIVATE) as cut_extrude7_sk1:
        with BuildLine():
            Line((-46.8, 177.7806075), (-34.8, 177.7806075))
            ThreePointArc((-34.8, 177.7806075), (-33.2, 176.1806075), (-34.8, 174.5806075))
            Line((-34.8, 174.5806075), (-46.8, 174.5806075))
            ThreePointArc((-46.8, 174.5806075), (-48.4, 176.1806075), (-46.8, 177.7806075))
        make_face()
    cut_extrude7_tool1 = extrude(cut_extrude7_sk1.sketch, amount=-CUT_EXTRUDE7_REACH, mode=Mode.PRIVATE) & part.part
    # Sketch15 → Cut-Extrude7 (cut, up to next)
    with BuildSketch(Plane.ZY.offset(5.832812), mode=Mode.PRIVATE) as cut_extrude7_sk2:
        with BuildLine():
            Line((-26.1, 21.18105), (-26.1, 18.18105))
            Line((-26.1, 18.18105), (-22.9, 18.18105))
            Line((-22.9, 18.18105), (-22.9, 21.18105))
            ThreePointArc((-22.9, 21.18105), (-24.5, 22.78105), (-26.1, 21.18105))
        make_face()
    cut_extrude7_tool2 = extrude(cut_extrude7_sk2.sketch, amount=-CUT_EXTRUDE7_REACH, mode=Mode.PRIVATE) & part.part
    add(cut_extrude7_tool1.solids().sort_by_distance((-5.832812, 176.180608, -40.8))[0], mode=Mode.SUBTRACT)
    add(cut_extrude7_tool2.solids().sort_by_distance((-5.832812, 20.324349, -24.5))[0], mode=Mode.SUBTRACT)

    # Fillet2
    fillet2_edges = [part.edges().sort_by_distance(p)[0] for p in [
        (6.667188, 222.1806075, 0.6),
        (-5.232812, 18.18105, -32),
        (-5.232812, 18.18105, -7),
        (-5.232812, 168.5806075, -38),
        (-5.232812, 184.5806075, -38),
    ]]
    fillet(fillet2_edges, radius=FILLET2_R)


solid = part.part
